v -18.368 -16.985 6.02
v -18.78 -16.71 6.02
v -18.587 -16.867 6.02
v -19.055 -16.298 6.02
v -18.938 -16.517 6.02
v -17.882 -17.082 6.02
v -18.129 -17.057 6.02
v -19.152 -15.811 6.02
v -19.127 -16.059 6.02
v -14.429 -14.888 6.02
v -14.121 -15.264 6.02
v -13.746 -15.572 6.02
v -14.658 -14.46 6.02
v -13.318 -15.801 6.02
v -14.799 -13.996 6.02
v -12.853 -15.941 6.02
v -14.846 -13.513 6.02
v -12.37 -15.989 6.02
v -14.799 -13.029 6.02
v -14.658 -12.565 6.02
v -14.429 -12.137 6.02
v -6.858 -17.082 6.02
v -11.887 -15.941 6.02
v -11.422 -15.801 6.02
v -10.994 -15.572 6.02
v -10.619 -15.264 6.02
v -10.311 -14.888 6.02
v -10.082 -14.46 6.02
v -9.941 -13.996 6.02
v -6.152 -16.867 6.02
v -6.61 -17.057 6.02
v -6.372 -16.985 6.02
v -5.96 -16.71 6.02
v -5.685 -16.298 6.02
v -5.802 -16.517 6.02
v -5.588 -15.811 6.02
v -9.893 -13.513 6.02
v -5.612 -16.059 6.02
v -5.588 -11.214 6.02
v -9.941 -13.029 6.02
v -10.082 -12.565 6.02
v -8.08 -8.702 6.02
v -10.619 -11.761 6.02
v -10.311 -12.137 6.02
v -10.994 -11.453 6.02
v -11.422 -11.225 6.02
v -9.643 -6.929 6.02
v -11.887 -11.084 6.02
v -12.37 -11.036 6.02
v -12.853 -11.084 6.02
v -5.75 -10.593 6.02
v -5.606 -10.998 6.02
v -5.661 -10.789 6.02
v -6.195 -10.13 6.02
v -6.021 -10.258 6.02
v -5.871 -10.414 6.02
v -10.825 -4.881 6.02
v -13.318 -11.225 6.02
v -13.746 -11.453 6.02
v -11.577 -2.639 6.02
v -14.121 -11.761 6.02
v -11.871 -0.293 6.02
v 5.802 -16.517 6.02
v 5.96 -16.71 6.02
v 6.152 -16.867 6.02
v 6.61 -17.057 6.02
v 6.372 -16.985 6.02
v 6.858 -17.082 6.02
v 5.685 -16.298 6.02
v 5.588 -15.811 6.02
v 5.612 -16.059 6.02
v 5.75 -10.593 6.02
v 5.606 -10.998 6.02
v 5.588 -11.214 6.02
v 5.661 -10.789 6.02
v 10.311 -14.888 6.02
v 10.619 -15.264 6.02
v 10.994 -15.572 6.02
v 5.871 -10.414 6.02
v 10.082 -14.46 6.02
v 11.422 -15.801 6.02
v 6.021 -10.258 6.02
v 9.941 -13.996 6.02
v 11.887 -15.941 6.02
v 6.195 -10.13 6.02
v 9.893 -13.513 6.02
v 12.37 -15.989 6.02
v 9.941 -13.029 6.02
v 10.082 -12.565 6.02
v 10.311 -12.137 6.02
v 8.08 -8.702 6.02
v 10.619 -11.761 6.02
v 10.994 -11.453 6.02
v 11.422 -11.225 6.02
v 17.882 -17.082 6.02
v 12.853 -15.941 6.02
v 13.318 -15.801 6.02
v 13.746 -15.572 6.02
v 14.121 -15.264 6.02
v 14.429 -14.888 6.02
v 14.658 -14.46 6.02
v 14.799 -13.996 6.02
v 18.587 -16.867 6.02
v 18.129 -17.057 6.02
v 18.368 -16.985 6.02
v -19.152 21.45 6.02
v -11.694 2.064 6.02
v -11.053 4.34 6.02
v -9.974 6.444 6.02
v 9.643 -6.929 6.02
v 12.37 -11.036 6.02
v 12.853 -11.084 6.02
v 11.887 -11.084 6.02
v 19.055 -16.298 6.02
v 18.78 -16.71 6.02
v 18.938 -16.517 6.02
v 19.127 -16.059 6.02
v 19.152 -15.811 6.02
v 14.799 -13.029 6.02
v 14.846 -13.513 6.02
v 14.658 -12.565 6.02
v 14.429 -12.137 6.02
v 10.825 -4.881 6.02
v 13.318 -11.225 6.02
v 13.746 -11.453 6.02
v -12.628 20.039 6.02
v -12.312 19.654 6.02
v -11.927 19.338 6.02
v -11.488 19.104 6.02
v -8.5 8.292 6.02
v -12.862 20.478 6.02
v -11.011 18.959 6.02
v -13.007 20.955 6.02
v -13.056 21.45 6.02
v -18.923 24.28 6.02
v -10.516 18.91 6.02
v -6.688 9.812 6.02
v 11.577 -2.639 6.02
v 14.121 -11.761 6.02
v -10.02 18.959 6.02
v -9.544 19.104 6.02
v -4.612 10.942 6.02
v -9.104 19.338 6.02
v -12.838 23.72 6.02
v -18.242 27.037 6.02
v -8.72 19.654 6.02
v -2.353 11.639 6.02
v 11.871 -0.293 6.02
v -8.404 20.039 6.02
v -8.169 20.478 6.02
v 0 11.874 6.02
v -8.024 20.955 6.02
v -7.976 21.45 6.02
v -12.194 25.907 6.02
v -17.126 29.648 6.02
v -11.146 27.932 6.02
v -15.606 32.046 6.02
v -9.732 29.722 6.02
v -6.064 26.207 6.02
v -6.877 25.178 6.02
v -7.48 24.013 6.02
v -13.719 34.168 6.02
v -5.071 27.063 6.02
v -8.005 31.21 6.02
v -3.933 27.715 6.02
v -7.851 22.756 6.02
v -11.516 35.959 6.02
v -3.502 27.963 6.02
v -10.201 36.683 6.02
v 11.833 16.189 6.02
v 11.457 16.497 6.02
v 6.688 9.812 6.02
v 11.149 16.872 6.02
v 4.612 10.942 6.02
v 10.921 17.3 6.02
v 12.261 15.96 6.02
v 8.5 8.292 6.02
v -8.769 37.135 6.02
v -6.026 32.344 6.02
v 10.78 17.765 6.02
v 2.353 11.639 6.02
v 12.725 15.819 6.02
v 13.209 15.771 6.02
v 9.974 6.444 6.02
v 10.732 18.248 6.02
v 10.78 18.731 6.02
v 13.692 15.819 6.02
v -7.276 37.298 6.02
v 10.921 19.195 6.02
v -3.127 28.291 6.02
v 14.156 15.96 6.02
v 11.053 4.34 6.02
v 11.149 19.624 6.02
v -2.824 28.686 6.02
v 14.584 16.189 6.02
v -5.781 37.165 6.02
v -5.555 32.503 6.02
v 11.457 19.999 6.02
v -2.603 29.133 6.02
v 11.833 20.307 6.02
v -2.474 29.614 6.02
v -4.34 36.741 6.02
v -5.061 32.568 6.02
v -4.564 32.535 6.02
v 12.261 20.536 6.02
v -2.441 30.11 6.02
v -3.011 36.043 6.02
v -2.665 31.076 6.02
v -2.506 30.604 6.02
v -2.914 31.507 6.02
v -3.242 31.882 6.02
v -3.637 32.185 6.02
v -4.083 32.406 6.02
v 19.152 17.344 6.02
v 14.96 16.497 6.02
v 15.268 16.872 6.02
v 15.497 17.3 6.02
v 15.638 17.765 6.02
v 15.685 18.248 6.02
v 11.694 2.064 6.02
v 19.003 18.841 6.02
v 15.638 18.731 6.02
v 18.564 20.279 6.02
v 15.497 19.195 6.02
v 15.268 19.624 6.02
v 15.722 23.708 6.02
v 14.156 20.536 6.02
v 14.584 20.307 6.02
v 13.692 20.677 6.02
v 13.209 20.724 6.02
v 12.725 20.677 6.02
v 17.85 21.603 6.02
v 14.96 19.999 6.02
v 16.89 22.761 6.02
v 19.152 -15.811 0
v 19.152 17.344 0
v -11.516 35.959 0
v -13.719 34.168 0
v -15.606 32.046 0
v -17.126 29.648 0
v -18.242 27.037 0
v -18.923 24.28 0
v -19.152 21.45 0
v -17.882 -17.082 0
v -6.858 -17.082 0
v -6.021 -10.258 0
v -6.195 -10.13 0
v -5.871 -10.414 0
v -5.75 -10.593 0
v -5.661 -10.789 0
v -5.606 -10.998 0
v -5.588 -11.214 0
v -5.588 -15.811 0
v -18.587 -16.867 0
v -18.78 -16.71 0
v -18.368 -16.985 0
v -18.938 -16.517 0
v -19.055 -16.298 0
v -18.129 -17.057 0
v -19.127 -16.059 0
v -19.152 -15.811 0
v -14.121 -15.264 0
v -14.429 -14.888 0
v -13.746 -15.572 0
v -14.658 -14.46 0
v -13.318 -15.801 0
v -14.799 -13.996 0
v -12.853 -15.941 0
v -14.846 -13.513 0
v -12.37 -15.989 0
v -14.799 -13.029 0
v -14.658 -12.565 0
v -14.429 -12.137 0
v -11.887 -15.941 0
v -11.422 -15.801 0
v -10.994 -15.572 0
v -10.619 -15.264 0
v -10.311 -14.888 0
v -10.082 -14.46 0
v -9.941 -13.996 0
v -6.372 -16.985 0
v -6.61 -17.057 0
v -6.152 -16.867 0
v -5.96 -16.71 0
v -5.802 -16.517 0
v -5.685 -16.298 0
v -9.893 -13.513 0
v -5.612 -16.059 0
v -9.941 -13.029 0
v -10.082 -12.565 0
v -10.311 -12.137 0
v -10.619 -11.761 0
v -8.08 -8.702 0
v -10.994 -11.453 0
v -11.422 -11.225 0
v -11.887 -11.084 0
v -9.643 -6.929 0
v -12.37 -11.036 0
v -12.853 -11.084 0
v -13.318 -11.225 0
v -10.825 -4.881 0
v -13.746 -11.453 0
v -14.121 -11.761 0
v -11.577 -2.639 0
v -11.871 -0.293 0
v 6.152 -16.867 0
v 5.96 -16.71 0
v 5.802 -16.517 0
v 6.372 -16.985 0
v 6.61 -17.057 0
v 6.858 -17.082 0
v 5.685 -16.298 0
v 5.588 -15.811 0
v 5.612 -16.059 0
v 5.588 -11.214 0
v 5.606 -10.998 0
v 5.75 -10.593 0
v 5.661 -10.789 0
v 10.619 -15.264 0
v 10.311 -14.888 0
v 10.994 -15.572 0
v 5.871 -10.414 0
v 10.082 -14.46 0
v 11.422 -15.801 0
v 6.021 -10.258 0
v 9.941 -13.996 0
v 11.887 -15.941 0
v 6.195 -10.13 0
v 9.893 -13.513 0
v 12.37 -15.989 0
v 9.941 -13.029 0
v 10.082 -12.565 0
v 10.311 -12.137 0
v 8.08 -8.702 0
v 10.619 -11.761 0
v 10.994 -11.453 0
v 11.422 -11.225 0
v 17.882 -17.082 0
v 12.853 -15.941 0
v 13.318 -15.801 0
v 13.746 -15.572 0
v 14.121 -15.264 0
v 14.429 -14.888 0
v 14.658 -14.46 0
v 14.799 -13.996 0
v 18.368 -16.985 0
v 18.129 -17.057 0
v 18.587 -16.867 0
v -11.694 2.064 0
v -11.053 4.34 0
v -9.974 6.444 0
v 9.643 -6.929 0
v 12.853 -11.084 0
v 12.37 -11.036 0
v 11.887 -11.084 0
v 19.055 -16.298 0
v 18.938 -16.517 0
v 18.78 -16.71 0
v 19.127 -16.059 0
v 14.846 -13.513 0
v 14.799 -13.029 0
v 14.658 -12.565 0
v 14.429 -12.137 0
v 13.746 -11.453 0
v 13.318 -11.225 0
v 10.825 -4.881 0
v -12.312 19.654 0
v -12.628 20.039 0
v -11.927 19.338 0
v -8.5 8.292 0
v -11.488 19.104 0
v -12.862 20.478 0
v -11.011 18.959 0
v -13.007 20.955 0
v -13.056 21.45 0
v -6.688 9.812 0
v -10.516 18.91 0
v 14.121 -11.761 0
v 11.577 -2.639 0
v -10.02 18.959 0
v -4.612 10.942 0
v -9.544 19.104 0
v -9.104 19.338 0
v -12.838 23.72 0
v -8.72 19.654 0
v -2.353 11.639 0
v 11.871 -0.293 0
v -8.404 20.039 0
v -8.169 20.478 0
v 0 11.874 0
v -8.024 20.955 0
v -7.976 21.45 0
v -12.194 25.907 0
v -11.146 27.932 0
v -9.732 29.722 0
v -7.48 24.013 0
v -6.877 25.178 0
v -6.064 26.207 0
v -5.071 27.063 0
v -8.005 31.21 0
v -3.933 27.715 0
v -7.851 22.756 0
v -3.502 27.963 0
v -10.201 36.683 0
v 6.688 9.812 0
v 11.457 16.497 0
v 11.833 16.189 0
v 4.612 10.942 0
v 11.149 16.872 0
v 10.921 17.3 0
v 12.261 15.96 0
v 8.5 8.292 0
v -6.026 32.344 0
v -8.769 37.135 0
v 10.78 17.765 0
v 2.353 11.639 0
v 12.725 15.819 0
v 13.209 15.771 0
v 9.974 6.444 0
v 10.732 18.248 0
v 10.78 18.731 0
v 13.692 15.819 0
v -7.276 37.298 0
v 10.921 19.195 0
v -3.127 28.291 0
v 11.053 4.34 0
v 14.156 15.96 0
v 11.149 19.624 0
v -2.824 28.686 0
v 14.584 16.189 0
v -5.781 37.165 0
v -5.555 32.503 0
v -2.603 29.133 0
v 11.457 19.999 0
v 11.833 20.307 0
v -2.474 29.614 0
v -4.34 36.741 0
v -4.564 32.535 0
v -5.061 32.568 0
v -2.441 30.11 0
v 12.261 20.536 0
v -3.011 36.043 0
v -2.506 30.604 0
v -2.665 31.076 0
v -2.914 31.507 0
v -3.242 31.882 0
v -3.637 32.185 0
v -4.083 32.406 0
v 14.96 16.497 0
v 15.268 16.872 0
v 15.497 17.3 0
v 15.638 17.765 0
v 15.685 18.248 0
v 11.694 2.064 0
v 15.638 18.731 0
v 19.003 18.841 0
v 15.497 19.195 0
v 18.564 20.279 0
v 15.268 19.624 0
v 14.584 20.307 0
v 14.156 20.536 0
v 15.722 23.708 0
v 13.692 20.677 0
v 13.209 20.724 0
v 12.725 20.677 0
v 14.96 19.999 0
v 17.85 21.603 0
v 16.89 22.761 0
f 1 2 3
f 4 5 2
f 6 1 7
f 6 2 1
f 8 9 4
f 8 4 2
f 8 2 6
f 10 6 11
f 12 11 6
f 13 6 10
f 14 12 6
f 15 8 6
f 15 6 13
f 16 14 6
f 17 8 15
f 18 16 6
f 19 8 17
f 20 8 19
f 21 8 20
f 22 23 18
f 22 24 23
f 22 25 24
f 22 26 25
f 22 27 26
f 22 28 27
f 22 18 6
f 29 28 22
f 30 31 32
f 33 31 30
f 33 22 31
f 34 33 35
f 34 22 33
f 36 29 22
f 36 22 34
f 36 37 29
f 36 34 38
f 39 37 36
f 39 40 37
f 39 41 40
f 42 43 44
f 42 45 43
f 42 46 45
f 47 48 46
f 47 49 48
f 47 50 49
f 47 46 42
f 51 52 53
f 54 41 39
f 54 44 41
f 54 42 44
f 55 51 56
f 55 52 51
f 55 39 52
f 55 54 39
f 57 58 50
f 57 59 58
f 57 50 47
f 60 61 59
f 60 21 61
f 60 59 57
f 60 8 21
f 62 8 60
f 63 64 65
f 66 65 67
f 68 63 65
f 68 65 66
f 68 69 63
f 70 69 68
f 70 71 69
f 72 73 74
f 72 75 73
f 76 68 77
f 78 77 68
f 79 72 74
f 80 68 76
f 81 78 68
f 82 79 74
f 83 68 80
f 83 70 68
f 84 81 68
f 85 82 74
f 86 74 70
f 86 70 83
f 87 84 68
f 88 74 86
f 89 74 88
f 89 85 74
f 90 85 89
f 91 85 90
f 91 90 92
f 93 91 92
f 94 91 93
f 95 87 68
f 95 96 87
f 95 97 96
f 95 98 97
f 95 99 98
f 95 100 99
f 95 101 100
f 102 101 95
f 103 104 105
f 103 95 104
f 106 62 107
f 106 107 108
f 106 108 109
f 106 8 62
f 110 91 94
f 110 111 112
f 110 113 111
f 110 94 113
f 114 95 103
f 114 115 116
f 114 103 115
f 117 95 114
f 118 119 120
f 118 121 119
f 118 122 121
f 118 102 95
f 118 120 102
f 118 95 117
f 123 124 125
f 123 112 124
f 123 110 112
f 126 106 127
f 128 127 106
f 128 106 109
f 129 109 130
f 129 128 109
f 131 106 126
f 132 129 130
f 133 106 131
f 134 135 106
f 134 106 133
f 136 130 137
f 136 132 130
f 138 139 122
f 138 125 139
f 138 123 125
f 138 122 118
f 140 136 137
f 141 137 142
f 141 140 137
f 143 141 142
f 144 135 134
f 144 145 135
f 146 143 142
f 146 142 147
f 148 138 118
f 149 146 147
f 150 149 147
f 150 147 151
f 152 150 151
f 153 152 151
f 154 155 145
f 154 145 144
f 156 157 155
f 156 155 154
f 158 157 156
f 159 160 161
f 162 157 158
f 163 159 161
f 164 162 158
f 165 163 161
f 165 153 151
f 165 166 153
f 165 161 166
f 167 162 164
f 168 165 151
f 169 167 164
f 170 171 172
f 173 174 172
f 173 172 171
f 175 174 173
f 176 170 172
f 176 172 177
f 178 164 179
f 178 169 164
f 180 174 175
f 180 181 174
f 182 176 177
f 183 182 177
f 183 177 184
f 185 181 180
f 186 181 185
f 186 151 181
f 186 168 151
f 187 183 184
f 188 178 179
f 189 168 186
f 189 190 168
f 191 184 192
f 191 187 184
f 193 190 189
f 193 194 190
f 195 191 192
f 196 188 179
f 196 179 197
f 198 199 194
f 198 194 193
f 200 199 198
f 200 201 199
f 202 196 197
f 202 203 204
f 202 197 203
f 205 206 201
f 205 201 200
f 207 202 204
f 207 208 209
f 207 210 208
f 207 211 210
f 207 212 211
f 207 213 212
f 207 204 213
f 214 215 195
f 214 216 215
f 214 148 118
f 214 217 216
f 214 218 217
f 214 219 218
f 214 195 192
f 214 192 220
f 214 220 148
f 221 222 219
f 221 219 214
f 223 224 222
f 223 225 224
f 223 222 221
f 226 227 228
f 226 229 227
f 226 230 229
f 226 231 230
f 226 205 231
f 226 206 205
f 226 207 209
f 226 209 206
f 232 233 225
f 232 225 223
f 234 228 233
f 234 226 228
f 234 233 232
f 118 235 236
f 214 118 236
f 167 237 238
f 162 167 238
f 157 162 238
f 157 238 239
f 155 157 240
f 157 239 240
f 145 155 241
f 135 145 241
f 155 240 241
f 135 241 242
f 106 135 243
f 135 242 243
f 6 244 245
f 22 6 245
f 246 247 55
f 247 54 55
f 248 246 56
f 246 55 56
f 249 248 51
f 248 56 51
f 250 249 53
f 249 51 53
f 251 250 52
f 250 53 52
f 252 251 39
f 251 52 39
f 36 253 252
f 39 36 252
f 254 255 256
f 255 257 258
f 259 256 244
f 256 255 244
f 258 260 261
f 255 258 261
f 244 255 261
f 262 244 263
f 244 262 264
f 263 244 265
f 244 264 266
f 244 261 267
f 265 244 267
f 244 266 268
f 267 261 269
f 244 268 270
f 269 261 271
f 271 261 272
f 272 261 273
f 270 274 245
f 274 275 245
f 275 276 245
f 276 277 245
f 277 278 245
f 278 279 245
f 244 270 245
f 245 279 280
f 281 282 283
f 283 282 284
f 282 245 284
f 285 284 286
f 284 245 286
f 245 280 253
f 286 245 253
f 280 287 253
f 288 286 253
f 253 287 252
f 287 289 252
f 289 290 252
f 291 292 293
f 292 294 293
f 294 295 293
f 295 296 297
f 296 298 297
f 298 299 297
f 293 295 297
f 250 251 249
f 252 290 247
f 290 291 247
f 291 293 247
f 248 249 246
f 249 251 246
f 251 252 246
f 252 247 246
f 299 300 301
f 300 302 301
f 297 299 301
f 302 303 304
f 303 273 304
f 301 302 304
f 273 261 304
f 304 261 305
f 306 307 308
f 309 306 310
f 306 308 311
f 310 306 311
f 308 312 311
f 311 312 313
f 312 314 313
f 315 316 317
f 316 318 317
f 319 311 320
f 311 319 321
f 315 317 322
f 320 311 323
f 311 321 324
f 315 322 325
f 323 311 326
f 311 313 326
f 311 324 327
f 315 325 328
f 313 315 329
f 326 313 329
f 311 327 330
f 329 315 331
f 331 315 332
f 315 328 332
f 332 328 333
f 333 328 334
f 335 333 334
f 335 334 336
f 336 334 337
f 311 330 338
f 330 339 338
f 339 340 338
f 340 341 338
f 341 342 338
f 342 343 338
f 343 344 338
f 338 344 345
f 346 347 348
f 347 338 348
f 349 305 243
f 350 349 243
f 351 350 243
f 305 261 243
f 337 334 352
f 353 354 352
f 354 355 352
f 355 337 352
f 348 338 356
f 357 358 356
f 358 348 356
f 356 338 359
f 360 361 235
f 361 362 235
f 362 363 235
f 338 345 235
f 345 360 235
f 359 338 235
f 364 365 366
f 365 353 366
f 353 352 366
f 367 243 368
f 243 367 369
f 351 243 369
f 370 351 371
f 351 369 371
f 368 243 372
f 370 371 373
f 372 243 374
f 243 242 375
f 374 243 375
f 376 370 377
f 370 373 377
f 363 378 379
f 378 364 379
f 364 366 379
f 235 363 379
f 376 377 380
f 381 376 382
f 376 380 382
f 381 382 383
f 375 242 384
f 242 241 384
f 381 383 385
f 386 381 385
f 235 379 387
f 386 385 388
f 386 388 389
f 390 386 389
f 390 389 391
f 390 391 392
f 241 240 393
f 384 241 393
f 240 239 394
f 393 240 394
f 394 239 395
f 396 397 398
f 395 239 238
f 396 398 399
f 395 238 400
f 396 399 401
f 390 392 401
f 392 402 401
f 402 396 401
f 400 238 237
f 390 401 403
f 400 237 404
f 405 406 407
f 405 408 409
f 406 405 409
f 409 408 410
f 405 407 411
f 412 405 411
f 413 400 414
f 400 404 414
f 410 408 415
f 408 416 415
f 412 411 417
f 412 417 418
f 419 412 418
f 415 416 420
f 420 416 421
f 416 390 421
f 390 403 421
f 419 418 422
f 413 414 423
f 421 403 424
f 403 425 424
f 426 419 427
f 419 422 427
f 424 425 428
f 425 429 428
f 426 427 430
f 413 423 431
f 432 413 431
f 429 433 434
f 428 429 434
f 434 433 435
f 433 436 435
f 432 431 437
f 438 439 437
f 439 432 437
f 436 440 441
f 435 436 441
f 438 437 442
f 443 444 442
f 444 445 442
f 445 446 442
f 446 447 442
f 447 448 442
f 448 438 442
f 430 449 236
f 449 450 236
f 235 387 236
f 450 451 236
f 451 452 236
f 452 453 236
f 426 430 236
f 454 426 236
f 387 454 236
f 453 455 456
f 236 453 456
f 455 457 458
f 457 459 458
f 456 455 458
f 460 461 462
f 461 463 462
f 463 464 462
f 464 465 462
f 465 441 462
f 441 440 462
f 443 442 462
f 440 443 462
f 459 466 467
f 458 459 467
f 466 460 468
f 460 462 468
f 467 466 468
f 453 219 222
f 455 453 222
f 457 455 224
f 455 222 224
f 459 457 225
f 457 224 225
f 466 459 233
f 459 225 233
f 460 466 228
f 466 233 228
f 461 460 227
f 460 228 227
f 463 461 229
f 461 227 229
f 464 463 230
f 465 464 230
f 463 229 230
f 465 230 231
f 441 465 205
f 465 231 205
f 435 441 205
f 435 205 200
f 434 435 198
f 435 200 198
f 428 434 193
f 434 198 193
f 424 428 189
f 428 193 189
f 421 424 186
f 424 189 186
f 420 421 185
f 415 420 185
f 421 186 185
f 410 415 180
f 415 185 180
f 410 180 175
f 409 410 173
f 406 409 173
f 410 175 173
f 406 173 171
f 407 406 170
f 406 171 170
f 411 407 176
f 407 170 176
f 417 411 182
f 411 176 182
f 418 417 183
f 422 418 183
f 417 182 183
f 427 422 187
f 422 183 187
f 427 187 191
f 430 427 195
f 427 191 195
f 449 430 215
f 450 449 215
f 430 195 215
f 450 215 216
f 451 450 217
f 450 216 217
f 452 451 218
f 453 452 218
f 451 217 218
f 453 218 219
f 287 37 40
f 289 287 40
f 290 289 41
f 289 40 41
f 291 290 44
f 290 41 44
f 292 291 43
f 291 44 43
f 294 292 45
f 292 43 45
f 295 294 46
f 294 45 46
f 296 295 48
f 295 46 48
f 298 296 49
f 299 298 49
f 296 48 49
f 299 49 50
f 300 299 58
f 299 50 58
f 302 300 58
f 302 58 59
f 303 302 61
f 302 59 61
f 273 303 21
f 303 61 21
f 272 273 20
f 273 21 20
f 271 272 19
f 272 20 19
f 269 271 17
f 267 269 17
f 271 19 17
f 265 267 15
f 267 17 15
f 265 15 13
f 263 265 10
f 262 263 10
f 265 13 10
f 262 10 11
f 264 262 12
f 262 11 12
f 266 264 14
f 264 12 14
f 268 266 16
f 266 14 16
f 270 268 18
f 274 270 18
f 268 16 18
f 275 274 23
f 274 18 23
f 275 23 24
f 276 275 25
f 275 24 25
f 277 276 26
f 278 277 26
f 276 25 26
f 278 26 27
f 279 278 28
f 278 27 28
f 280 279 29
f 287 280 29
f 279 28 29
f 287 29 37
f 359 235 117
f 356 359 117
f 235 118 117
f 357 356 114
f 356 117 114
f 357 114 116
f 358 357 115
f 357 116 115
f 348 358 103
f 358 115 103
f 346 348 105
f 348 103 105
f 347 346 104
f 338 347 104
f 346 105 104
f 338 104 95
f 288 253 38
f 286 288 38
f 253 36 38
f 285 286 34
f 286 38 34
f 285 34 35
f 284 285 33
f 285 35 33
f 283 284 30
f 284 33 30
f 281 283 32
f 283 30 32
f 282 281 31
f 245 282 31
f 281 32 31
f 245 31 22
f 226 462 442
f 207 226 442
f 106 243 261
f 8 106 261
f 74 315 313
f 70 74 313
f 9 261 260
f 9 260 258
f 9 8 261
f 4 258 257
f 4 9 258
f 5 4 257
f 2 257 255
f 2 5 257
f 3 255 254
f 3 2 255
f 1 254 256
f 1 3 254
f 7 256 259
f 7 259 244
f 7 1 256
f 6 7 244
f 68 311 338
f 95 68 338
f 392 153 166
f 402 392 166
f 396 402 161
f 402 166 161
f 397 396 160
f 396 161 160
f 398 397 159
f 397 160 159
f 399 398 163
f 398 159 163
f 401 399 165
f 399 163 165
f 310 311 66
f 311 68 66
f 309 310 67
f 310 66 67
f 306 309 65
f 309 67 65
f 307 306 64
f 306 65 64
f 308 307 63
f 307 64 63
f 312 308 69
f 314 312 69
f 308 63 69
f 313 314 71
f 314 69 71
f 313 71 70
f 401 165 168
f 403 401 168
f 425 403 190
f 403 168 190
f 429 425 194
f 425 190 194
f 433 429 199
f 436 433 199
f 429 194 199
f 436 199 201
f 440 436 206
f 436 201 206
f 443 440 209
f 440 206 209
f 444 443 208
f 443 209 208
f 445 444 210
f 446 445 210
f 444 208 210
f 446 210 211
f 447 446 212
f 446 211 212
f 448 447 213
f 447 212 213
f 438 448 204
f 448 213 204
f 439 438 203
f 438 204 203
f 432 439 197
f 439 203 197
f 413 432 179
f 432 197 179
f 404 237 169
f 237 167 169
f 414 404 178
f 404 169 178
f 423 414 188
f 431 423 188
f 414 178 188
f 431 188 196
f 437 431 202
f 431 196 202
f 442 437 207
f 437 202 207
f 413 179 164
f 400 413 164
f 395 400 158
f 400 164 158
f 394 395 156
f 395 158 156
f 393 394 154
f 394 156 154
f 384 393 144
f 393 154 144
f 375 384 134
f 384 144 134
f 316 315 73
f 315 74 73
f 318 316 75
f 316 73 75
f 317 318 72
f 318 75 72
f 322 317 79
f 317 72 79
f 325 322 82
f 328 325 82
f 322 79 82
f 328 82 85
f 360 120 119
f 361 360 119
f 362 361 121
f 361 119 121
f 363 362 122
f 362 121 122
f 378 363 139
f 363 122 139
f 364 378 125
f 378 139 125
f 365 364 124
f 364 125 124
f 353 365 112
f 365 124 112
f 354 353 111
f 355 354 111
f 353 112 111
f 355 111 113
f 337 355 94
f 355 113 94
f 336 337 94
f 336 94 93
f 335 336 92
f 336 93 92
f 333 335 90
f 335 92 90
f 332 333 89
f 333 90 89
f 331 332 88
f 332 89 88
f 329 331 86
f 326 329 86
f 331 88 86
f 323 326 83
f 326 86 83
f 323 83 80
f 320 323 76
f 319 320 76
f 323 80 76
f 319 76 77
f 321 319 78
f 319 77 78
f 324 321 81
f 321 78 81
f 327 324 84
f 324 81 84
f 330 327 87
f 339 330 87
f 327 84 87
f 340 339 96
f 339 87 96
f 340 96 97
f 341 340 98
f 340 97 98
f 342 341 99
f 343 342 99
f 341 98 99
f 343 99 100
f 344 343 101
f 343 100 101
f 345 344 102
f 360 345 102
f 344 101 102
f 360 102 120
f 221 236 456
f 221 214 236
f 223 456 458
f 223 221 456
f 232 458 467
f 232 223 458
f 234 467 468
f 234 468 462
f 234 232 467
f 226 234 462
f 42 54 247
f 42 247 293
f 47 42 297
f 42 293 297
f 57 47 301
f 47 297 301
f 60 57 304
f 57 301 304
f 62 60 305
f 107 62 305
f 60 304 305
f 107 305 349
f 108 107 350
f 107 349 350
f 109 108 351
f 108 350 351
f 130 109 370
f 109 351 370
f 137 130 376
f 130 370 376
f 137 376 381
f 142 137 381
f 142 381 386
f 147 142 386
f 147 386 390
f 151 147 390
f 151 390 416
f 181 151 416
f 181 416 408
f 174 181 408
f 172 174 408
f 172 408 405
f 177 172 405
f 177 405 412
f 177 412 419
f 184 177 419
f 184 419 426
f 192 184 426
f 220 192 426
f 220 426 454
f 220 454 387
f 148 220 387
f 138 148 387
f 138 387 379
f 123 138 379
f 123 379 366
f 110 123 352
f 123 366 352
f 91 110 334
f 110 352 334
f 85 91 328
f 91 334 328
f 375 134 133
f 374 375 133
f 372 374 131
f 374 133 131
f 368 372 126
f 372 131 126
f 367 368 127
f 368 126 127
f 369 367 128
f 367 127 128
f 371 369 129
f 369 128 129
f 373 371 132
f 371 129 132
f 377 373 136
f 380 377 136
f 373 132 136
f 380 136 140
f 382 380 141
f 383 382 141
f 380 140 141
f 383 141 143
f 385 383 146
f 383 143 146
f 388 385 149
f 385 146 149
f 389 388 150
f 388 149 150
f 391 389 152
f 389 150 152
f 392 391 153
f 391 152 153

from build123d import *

# Parameters (mm, degrees)
F1_DEPTH = 6.0198
F3_DEPTH = 6.0198
F4_R     = 7.62
F5_R     = 1.27
F6_R     = 2.4765
F7_DEPTH = 6.0198


with BuildPart() as f1:
    # F0 (on Top) → F1 (new body)
    with BuildSketch(Plane.XY):
        with BuildLine():
            ThreePointArc((-5.588, -10.4775), (0, 11.8745), (5.588, -10.4775))
            Line((5.588, -10.4775), (5.588, -17.0815))
            Line((5.588, -17.0815), (19.1516, -17.0815))
            Line((19.1516, -17.0815), (19.1516, 21.4503))
            Line((19.1516, 21.4503), (-6.5024, 38.3413))
            ThreePointArc((-6.5024, 38.3413), (-15.638779, 32.001463), (-19.1516, 21.4503))
            Line((-19.1516, 21.4503), (-19.1516, -17.0815))
            Line((-19.1516, -17.0815), (-5.588, -17.0815))
            Line((-5.588, -17.0815), (-5.588, -10.4775))
        make_face()
    extrude(amount=F1_DEPTH)

    # F2 (on face) → F3 (cut, through all)
    with BuildSketch(Plane.XY.offset(6.0198)):
        with BuildLine():
            ThreePointArc((-6.026316, 32.343552), (-11.145726, 27.932464), (-13.0556, 21.4503))
            ThreePointArc((-13.0556, 21.4503), (-10.5156, 18.9103), (-7.9756, 21.4503))
            ThreePointArc((-7.9756, 21.4503), (-6.877265, 25.178077), (-3.933183, 27.714816))
            ThreePointArc((-3.933183, 27.714816), (-2.665381, 31.07575), (-6.026316, 32.343552))
        make_face()
    extrude(amount=-F3_DEPTH, mode=Mode.SUBTRACT)

    # F4
    f4_edges = [f1.edges().sort_by_distance(p)[0] for p in [
        (-6.5024, 38.3413, 3.0099),
        (19.1516, 21.4503, 3.0099),
    ]]
    fillet(f4_edges, radius=F4_R)

    # F5
    f5_edges = [f1.edges().sort_by_distance(p)[0] for p in [
        (-19.1516, -17.0815, 3.0099),
        (-5.588, -17.0815, 3.0099),
        (5.588, -17.0815, 3.0099),
        (19.1516, -17.0815, 3.0099),
        (5.588, -10.4775, 3.0099),
        (-5.588, -10.4775, 3.0099),
    ]]
    fillet(f5_edges, radius=F5_R)

    # F6 (on face) → F7 (cut, through all)
    with BuildSketch(Plane.XY.offset(6.0198)):
        with Locations((13.208606, 18.247754)):
            Circle(F6_R)
        with Locations((-12.3698, -13.51257)):
            Circle(F6_R)
        with Locations((12.3698, -13.51257)):
            Circle(F6_R)
    extrude(amount=-F7_DEPTH, mode=Mode.SUBTRACT)


solid = f1.part
